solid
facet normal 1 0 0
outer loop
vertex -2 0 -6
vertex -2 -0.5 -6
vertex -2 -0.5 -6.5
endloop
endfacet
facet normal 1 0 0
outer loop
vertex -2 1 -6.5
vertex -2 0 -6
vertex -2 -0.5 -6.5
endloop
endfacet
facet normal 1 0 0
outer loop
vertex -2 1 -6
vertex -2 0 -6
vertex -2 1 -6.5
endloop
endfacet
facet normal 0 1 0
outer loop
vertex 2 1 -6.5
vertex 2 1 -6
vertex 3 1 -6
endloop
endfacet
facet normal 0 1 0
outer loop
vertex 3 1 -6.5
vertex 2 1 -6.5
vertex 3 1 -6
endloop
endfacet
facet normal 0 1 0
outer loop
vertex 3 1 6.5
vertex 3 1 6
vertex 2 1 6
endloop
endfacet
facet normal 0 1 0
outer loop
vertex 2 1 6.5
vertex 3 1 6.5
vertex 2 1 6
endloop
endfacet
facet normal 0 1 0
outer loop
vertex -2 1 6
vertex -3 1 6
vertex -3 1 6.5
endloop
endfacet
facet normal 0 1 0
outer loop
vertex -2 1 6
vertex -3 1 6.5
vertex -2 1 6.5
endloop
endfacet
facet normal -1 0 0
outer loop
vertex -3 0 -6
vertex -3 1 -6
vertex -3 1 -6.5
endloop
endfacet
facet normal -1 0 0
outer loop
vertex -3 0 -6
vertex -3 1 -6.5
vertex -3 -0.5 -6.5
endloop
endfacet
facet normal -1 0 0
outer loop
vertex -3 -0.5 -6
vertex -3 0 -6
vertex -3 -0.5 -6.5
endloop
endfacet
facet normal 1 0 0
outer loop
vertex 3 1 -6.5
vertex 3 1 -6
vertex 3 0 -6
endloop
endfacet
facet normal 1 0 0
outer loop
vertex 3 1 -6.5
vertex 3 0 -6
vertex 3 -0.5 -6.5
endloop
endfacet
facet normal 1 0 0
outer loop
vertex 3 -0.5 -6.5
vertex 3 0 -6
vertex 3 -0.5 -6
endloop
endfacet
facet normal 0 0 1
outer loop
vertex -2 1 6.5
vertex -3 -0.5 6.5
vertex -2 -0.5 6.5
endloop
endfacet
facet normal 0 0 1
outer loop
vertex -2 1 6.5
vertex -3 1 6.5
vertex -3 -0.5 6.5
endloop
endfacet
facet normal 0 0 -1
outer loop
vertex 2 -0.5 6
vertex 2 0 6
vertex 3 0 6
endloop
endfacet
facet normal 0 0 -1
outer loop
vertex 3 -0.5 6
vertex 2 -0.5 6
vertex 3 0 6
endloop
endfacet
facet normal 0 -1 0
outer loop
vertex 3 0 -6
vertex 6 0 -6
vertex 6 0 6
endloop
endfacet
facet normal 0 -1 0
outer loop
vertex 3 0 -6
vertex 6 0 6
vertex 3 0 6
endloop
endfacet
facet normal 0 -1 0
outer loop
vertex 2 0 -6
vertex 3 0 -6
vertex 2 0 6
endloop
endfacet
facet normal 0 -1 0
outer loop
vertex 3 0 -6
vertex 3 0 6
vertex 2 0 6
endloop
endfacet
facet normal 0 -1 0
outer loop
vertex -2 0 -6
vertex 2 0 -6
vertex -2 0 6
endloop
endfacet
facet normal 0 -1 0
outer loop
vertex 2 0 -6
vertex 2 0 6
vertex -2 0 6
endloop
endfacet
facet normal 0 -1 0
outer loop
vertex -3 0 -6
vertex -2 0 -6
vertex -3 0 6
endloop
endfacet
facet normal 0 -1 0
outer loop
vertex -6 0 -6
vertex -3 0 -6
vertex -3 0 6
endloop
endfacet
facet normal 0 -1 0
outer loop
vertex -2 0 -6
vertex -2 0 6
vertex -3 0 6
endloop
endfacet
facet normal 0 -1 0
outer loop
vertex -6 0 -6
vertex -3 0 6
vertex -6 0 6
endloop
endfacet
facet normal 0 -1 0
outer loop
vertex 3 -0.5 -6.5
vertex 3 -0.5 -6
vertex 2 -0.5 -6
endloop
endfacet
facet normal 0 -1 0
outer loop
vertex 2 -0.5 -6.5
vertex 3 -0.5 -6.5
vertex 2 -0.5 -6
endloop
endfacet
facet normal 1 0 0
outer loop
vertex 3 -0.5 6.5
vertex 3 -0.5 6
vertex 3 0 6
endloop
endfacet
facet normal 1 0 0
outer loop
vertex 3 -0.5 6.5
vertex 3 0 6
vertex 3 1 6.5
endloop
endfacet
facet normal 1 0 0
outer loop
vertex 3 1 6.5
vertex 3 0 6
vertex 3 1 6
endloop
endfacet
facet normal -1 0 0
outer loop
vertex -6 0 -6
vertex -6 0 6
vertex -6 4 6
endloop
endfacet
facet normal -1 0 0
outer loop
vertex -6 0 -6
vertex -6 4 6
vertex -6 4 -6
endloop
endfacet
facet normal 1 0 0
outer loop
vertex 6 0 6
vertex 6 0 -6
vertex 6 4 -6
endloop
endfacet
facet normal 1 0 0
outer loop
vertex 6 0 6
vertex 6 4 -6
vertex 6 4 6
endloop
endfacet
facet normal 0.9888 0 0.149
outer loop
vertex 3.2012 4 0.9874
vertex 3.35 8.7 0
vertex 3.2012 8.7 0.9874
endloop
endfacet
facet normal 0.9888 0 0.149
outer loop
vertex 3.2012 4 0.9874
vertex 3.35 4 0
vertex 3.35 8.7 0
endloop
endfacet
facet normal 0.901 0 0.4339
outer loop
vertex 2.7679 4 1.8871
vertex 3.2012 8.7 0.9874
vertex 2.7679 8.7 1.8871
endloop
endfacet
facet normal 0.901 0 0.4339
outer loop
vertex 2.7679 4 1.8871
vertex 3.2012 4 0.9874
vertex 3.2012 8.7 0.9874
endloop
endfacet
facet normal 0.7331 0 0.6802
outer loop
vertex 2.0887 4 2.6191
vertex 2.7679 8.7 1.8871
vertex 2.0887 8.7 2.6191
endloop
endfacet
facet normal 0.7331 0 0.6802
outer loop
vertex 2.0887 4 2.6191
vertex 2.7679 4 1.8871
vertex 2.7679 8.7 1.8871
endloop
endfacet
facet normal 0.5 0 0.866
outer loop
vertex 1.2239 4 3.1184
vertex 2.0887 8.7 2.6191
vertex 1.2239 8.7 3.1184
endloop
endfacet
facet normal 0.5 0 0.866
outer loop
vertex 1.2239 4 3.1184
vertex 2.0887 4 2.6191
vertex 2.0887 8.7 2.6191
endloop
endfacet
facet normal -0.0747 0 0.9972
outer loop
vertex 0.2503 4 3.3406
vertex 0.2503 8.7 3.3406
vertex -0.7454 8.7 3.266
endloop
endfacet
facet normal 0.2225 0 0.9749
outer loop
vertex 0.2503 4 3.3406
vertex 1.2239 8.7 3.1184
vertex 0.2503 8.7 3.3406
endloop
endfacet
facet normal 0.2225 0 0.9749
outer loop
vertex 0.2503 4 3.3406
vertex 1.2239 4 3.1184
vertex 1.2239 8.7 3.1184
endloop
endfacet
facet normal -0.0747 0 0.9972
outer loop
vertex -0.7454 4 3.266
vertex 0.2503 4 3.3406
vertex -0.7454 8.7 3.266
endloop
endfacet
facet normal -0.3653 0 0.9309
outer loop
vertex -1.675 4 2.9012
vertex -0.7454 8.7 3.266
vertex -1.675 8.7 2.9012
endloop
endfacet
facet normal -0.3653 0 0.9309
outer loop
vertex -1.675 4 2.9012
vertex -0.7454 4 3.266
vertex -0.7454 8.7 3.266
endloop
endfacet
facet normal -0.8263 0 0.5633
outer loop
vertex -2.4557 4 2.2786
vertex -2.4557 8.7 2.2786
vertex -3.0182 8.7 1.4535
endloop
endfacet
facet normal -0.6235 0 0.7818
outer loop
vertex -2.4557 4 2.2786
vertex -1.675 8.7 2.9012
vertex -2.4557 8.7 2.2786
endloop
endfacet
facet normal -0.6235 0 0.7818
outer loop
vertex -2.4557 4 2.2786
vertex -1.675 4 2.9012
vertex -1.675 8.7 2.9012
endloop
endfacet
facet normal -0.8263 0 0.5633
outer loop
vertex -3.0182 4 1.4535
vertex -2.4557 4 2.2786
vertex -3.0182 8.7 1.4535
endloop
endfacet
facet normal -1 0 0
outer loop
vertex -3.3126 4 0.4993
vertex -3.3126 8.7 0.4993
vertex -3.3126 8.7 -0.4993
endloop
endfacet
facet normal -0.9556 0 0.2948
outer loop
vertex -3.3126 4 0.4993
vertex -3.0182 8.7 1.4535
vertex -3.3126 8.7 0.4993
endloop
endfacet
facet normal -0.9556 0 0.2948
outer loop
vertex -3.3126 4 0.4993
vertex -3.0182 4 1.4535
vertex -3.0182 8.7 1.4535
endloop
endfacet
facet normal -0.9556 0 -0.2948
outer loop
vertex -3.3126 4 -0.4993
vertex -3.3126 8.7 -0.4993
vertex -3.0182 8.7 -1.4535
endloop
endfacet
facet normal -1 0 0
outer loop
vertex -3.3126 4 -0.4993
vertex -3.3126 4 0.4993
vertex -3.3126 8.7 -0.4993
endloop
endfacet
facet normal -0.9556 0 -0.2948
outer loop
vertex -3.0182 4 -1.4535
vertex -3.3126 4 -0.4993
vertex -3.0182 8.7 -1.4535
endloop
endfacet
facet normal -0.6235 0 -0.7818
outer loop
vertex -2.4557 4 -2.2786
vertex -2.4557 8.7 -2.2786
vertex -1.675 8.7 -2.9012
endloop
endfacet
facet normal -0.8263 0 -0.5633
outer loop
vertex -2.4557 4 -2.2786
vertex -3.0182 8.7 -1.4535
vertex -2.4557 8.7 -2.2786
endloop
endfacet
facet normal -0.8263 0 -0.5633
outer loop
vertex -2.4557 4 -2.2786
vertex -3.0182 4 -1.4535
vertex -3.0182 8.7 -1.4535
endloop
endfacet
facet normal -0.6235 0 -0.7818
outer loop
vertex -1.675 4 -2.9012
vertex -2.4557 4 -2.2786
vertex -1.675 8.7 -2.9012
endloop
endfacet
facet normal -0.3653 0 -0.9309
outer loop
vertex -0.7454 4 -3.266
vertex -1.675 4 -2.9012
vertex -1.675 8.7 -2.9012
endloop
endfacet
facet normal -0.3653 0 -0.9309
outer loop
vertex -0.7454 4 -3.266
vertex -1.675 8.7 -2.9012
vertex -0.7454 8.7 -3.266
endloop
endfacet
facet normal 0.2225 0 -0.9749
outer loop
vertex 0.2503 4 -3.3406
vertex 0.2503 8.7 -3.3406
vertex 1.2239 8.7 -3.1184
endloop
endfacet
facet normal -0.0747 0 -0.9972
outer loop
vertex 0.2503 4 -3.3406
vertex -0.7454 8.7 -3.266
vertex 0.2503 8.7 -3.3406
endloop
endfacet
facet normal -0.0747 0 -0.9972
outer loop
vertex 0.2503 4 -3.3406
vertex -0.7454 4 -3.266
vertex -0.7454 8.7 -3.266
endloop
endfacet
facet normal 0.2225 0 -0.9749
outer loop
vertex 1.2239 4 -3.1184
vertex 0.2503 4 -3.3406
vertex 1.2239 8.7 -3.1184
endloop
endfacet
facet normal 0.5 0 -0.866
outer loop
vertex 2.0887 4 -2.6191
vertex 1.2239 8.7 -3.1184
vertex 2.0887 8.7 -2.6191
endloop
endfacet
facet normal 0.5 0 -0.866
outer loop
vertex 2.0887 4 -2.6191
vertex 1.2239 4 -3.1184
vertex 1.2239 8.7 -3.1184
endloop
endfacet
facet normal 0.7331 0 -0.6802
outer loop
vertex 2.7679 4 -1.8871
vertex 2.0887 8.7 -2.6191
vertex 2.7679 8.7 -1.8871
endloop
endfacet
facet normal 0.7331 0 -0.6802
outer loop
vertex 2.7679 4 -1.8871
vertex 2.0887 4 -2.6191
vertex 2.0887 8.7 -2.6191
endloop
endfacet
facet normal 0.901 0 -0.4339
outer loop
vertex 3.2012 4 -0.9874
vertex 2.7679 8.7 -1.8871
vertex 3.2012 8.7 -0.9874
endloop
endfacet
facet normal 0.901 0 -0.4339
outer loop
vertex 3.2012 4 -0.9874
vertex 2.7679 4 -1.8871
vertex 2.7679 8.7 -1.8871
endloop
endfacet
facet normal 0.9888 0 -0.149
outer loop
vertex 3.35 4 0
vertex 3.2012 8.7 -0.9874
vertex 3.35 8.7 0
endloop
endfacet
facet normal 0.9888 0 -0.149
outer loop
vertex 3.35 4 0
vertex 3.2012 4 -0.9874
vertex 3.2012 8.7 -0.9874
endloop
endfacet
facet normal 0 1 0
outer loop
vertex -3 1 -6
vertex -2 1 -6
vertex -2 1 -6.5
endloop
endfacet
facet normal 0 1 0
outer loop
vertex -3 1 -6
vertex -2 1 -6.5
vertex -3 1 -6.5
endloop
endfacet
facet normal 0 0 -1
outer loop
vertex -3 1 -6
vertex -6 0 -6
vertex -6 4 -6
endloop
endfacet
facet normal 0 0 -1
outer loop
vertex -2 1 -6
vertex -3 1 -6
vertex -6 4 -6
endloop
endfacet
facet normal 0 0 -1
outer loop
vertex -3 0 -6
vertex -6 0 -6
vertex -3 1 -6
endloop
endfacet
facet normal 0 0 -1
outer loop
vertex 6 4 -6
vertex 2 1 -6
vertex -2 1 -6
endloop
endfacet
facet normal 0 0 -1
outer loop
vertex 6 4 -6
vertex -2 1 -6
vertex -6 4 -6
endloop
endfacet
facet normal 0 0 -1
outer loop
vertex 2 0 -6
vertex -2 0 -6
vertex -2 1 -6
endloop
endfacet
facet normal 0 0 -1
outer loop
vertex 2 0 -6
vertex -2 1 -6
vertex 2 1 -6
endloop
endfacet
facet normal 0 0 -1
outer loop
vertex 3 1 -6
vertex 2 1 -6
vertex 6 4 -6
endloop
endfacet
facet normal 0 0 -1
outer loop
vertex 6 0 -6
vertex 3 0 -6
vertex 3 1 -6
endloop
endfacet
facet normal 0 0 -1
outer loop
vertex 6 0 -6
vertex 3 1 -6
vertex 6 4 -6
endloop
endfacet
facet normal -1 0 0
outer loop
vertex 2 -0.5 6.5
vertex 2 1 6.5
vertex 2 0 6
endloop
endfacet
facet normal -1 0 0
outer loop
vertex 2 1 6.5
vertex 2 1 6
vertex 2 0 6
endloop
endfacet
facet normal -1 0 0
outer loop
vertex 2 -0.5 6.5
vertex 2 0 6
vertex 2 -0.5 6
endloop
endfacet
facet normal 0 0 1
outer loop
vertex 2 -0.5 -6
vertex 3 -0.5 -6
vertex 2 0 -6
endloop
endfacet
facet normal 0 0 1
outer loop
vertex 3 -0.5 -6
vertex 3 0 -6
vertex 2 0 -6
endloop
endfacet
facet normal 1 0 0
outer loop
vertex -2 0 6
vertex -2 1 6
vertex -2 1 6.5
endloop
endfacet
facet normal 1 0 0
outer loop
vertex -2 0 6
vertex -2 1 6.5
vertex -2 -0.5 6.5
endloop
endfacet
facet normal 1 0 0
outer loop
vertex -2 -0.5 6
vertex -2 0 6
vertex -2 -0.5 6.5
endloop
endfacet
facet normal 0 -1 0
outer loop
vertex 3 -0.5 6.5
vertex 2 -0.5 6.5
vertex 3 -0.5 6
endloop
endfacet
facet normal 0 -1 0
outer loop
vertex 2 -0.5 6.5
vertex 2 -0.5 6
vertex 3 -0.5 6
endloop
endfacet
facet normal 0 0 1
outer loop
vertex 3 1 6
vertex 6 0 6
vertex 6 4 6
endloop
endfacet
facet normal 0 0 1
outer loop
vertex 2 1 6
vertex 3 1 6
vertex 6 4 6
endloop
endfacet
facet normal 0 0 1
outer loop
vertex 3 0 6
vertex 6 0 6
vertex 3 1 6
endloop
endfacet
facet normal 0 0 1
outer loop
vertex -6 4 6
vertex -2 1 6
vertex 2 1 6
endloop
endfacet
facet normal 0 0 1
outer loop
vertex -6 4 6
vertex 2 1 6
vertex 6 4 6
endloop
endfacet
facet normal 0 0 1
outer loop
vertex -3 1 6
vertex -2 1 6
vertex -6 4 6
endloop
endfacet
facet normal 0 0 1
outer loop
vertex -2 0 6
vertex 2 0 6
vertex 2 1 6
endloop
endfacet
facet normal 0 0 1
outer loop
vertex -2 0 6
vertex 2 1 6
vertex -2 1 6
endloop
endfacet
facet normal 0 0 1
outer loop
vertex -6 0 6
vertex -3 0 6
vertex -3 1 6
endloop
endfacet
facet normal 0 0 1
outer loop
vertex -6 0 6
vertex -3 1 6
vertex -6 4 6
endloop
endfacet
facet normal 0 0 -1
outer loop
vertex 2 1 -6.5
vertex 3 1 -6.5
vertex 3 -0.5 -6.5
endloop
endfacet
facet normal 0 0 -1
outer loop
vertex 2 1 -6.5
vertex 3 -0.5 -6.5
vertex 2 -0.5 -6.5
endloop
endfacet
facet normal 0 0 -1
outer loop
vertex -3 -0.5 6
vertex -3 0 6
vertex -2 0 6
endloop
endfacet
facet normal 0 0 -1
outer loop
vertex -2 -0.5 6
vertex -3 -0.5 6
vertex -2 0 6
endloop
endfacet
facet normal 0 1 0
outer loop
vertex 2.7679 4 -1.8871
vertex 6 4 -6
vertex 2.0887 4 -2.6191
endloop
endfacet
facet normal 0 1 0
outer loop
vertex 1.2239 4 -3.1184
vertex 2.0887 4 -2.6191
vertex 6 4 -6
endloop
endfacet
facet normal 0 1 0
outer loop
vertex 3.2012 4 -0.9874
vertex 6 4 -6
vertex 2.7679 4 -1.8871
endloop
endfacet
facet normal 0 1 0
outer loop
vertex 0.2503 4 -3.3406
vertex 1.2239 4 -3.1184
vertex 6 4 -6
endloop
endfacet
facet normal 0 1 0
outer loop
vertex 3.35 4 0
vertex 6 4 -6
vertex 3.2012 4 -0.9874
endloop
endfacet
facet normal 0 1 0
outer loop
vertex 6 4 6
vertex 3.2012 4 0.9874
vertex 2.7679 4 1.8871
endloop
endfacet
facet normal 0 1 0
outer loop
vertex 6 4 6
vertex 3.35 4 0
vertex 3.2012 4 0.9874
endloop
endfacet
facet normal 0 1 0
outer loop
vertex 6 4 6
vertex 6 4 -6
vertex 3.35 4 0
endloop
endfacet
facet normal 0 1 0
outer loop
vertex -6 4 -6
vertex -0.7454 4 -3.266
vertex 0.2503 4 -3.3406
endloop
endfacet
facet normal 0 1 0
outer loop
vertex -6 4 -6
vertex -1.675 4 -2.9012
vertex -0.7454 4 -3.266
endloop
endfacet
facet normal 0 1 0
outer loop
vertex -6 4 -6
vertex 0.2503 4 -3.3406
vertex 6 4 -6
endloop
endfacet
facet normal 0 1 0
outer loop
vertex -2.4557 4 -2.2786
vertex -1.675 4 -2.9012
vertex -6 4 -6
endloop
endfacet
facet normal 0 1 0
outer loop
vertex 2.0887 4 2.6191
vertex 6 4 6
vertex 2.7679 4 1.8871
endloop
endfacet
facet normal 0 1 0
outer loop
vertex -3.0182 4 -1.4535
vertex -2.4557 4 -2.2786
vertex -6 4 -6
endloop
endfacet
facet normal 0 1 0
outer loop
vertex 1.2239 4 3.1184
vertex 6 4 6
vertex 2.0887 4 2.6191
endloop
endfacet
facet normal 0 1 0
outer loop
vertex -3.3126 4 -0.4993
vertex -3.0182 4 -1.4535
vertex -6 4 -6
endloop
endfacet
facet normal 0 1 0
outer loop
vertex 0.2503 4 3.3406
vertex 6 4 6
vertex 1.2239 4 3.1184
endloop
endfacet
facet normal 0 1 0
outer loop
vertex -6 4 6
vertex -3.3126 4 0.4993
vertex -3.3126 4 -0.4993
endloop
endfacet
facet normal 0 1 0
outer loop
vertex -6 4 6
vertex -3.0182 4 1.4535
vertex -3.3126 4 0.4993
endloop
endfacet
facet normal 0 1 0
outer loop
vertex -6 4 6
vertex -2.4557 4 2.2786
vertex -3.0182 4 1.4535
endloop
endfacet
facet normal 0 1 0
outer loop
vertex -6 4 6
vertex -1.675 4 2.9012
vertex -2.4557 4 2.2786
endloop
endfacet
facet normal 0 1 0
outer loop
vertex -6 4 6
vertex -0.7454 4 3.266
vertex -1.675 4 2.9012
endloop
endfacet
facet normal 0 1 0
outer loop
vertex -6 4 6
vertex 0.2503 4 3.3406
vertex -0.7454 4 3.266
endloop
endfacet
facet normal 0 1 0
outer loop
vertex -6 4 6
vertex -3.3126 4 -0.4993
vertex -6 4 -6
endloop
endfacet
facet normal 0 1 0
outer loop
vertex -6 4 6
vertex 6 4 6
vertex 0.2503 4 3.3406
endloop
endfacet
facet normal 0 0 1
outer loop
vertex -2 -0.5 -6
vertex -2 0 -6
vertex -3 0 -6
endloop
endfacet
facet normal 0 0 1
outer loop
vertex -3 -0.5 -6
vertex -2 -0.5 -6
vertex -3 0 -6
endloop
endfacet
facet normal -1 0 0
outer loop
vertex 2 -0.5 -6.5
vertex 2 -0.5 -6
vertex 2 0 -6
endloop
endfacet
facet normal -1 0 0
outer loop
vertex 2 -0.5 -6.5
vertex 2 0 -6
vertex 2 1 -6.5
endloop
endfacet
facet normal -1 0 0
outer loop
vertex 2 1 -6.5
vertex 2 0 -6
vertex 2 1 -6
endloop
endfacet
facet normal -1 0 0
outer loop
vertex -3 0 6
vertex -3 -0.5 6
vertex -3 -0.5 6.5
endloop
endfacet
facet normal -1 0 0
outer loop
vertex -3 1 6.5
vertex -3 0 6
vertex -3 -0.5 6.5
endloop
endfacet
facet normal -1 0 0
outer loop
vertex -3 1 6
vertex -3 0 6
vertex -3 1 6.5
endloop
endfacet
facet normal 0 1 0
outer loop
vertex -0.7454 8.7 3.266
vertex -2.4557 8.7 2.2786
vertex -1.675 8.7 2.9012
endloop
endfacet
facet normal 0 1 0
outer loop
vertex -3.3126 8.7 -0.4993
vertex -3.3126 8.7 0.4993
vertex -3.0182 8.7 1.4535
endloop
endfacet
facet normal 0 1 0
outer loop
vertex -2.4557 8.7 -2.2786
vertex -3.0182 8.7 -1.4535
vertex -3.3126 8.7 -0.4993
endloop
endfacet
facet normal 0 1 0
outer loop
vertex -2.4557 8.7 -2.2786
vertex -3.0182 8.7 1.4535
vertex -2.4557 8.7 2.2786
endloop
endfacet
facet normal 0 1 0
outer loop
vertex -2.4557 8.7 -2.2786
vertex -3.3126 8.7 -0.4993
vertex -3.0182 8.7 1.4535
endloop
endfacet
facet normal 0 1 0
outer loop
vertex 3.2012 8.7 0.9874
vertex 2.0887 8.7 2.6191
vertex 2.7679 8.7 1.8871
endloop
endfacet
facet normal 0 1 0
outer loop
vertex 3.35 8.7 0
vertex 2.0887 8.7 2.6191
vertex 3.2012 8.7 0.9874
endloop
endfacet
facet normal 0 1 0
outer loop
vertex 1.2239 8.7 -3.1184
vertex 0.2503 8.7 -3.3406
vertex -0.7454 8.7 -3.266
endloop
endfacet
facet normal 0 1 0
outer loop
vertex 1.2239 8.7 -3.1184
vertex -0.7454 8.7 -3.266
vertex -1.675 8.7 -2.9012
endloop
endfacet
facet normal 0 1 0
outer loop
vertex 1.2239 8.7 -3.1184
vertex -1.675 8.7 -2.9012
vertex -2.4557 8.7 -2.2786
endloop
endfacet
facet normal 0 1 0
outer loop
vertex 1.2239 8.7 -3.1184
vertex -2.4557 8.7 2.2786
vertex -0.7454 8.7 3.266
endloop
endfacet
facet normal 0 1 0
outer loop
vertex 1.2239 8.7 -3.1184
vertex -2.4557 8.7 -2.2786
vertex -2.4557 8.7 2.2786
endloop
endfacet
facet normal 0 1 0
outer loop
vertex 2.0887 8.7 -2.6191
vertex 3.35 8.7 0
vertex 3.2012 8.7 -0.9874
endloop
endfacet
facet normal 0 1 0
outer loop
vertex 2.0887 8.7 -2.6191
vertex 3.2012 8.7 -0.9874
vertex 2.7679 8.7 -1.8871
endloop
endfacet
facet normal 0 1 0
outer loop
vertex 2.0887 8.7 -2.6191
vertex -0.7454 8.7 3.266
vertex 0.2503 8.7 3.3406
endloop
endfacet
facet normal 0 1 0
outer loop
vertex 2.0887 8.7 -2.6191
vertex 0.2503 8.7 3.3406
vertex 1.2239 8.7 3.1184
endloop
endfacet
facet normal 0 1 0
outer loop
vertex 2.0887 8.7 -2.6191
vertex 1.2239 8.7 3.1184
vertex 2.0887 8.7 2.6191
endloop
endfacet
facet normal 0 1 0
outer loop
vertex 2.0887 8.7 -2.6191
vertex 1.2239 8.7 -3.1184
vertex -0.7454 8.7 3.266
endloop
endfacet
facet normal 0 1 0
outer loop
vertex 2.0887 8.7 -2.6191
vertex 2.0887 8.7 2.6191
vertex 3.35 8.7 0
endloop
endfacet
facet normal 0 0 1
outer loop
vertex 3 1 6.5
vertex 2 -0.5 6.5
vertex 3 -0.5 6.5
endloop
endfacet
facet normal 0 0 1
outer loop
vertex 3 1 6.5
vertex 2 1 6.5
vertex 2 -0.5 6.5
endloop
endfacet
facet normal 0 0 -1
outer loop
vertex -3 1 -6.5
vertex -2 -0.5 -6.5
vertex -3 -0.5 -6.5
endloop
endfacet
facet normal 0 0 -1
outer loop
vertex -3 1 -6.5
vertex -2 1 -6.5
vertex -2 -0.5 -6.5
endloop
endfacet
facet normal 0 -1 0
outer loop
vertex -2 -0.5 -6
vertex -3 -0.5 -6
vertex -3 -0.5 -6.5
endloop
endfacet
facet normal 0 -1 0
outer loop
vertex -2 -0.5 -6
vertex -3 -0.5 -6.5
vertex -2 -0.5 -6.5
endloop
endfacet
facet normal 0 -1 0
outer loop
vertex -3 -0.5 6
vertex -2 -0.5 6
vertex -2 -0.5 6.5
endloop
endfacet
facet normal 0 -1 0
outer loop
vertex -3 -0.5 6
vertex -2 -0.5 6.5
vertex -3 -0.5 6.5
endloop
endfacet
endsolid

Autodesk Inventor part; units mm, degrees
ref_plane "YZ Plane" through (0, 0, 0) normal (1, 0, 0) x (0, 1, 0)
ref_plane "XZ Plane" through (0, 0, 0) normal (0, 1, 0) x (-1, 0, 0)
sketch "Sketch1" plane through (0, 0, 0) normal (0, 1, 0) x (-1, 0, 0)
  line L0 (-6, 6) -> (6, 6)
  line L1 (6, 6) -> (6, -6)
  line L2 (6, -6) -> (-6, -6)
  line L3 (-6, -6) -> (-6, 6)
  line L4 (-6, 6) -> (6, -6) construction
  line L5 (6, 6) -> (-6, -6) construction
  point P0 (0, 0)
  dimension "d0" = 12
  dimension "d1" = 12
extrude "Extrusion1" add sketch "Sketch1" along normal blind 4
sketch "Sketch2" plane through (0, 4, 0) normal (0, 1, 0) x (1, 0, 0)
  circle A0 centre (0, 0) radius 3.35
  dimension "d4" = 6.7
extrude "Extrusion2" add sketch "Sketch2" along normal blind 4.7
sketch "Sketch3" plane through (-6, 0, 6) normal (0, 0, 1) x (1, 0, 0)
  line L0 (3, 1) -> (4, 1)
  line L1 (4, 1) -> (4, -0.5)
  line L2 (12, 0) -> (0, 0) projected
  line L3 (4, -0.5) -> (3, -0.5)
  line L4 (3, -0.5) -> (3, 1)
  line L5 (0, 0) -> (0, 4) projected
  line L6 (6, 3.8576) -> (6, 0) construction
  line L7 (9, 1) -> (8, 1)
  line L8 (8, 1) -> (8, -0.5)
  line L9 (8, -0.5) -> (9, -0.5)
  line L10 (9, -0.5) -> (9, 1)
  dimension "d7" = 1
  dimension "d8" = 1
  dimension "d9" = 1.5
  dimension "d10" = 3
extrude "Extrusion3" add sketch "Sketch3" along normal blind 0.5
mirror "Mirror1" about plane through (0, 0, 0) normal (0, 0, 1) of "Extrusion3"
properties part number "Push_Button"
